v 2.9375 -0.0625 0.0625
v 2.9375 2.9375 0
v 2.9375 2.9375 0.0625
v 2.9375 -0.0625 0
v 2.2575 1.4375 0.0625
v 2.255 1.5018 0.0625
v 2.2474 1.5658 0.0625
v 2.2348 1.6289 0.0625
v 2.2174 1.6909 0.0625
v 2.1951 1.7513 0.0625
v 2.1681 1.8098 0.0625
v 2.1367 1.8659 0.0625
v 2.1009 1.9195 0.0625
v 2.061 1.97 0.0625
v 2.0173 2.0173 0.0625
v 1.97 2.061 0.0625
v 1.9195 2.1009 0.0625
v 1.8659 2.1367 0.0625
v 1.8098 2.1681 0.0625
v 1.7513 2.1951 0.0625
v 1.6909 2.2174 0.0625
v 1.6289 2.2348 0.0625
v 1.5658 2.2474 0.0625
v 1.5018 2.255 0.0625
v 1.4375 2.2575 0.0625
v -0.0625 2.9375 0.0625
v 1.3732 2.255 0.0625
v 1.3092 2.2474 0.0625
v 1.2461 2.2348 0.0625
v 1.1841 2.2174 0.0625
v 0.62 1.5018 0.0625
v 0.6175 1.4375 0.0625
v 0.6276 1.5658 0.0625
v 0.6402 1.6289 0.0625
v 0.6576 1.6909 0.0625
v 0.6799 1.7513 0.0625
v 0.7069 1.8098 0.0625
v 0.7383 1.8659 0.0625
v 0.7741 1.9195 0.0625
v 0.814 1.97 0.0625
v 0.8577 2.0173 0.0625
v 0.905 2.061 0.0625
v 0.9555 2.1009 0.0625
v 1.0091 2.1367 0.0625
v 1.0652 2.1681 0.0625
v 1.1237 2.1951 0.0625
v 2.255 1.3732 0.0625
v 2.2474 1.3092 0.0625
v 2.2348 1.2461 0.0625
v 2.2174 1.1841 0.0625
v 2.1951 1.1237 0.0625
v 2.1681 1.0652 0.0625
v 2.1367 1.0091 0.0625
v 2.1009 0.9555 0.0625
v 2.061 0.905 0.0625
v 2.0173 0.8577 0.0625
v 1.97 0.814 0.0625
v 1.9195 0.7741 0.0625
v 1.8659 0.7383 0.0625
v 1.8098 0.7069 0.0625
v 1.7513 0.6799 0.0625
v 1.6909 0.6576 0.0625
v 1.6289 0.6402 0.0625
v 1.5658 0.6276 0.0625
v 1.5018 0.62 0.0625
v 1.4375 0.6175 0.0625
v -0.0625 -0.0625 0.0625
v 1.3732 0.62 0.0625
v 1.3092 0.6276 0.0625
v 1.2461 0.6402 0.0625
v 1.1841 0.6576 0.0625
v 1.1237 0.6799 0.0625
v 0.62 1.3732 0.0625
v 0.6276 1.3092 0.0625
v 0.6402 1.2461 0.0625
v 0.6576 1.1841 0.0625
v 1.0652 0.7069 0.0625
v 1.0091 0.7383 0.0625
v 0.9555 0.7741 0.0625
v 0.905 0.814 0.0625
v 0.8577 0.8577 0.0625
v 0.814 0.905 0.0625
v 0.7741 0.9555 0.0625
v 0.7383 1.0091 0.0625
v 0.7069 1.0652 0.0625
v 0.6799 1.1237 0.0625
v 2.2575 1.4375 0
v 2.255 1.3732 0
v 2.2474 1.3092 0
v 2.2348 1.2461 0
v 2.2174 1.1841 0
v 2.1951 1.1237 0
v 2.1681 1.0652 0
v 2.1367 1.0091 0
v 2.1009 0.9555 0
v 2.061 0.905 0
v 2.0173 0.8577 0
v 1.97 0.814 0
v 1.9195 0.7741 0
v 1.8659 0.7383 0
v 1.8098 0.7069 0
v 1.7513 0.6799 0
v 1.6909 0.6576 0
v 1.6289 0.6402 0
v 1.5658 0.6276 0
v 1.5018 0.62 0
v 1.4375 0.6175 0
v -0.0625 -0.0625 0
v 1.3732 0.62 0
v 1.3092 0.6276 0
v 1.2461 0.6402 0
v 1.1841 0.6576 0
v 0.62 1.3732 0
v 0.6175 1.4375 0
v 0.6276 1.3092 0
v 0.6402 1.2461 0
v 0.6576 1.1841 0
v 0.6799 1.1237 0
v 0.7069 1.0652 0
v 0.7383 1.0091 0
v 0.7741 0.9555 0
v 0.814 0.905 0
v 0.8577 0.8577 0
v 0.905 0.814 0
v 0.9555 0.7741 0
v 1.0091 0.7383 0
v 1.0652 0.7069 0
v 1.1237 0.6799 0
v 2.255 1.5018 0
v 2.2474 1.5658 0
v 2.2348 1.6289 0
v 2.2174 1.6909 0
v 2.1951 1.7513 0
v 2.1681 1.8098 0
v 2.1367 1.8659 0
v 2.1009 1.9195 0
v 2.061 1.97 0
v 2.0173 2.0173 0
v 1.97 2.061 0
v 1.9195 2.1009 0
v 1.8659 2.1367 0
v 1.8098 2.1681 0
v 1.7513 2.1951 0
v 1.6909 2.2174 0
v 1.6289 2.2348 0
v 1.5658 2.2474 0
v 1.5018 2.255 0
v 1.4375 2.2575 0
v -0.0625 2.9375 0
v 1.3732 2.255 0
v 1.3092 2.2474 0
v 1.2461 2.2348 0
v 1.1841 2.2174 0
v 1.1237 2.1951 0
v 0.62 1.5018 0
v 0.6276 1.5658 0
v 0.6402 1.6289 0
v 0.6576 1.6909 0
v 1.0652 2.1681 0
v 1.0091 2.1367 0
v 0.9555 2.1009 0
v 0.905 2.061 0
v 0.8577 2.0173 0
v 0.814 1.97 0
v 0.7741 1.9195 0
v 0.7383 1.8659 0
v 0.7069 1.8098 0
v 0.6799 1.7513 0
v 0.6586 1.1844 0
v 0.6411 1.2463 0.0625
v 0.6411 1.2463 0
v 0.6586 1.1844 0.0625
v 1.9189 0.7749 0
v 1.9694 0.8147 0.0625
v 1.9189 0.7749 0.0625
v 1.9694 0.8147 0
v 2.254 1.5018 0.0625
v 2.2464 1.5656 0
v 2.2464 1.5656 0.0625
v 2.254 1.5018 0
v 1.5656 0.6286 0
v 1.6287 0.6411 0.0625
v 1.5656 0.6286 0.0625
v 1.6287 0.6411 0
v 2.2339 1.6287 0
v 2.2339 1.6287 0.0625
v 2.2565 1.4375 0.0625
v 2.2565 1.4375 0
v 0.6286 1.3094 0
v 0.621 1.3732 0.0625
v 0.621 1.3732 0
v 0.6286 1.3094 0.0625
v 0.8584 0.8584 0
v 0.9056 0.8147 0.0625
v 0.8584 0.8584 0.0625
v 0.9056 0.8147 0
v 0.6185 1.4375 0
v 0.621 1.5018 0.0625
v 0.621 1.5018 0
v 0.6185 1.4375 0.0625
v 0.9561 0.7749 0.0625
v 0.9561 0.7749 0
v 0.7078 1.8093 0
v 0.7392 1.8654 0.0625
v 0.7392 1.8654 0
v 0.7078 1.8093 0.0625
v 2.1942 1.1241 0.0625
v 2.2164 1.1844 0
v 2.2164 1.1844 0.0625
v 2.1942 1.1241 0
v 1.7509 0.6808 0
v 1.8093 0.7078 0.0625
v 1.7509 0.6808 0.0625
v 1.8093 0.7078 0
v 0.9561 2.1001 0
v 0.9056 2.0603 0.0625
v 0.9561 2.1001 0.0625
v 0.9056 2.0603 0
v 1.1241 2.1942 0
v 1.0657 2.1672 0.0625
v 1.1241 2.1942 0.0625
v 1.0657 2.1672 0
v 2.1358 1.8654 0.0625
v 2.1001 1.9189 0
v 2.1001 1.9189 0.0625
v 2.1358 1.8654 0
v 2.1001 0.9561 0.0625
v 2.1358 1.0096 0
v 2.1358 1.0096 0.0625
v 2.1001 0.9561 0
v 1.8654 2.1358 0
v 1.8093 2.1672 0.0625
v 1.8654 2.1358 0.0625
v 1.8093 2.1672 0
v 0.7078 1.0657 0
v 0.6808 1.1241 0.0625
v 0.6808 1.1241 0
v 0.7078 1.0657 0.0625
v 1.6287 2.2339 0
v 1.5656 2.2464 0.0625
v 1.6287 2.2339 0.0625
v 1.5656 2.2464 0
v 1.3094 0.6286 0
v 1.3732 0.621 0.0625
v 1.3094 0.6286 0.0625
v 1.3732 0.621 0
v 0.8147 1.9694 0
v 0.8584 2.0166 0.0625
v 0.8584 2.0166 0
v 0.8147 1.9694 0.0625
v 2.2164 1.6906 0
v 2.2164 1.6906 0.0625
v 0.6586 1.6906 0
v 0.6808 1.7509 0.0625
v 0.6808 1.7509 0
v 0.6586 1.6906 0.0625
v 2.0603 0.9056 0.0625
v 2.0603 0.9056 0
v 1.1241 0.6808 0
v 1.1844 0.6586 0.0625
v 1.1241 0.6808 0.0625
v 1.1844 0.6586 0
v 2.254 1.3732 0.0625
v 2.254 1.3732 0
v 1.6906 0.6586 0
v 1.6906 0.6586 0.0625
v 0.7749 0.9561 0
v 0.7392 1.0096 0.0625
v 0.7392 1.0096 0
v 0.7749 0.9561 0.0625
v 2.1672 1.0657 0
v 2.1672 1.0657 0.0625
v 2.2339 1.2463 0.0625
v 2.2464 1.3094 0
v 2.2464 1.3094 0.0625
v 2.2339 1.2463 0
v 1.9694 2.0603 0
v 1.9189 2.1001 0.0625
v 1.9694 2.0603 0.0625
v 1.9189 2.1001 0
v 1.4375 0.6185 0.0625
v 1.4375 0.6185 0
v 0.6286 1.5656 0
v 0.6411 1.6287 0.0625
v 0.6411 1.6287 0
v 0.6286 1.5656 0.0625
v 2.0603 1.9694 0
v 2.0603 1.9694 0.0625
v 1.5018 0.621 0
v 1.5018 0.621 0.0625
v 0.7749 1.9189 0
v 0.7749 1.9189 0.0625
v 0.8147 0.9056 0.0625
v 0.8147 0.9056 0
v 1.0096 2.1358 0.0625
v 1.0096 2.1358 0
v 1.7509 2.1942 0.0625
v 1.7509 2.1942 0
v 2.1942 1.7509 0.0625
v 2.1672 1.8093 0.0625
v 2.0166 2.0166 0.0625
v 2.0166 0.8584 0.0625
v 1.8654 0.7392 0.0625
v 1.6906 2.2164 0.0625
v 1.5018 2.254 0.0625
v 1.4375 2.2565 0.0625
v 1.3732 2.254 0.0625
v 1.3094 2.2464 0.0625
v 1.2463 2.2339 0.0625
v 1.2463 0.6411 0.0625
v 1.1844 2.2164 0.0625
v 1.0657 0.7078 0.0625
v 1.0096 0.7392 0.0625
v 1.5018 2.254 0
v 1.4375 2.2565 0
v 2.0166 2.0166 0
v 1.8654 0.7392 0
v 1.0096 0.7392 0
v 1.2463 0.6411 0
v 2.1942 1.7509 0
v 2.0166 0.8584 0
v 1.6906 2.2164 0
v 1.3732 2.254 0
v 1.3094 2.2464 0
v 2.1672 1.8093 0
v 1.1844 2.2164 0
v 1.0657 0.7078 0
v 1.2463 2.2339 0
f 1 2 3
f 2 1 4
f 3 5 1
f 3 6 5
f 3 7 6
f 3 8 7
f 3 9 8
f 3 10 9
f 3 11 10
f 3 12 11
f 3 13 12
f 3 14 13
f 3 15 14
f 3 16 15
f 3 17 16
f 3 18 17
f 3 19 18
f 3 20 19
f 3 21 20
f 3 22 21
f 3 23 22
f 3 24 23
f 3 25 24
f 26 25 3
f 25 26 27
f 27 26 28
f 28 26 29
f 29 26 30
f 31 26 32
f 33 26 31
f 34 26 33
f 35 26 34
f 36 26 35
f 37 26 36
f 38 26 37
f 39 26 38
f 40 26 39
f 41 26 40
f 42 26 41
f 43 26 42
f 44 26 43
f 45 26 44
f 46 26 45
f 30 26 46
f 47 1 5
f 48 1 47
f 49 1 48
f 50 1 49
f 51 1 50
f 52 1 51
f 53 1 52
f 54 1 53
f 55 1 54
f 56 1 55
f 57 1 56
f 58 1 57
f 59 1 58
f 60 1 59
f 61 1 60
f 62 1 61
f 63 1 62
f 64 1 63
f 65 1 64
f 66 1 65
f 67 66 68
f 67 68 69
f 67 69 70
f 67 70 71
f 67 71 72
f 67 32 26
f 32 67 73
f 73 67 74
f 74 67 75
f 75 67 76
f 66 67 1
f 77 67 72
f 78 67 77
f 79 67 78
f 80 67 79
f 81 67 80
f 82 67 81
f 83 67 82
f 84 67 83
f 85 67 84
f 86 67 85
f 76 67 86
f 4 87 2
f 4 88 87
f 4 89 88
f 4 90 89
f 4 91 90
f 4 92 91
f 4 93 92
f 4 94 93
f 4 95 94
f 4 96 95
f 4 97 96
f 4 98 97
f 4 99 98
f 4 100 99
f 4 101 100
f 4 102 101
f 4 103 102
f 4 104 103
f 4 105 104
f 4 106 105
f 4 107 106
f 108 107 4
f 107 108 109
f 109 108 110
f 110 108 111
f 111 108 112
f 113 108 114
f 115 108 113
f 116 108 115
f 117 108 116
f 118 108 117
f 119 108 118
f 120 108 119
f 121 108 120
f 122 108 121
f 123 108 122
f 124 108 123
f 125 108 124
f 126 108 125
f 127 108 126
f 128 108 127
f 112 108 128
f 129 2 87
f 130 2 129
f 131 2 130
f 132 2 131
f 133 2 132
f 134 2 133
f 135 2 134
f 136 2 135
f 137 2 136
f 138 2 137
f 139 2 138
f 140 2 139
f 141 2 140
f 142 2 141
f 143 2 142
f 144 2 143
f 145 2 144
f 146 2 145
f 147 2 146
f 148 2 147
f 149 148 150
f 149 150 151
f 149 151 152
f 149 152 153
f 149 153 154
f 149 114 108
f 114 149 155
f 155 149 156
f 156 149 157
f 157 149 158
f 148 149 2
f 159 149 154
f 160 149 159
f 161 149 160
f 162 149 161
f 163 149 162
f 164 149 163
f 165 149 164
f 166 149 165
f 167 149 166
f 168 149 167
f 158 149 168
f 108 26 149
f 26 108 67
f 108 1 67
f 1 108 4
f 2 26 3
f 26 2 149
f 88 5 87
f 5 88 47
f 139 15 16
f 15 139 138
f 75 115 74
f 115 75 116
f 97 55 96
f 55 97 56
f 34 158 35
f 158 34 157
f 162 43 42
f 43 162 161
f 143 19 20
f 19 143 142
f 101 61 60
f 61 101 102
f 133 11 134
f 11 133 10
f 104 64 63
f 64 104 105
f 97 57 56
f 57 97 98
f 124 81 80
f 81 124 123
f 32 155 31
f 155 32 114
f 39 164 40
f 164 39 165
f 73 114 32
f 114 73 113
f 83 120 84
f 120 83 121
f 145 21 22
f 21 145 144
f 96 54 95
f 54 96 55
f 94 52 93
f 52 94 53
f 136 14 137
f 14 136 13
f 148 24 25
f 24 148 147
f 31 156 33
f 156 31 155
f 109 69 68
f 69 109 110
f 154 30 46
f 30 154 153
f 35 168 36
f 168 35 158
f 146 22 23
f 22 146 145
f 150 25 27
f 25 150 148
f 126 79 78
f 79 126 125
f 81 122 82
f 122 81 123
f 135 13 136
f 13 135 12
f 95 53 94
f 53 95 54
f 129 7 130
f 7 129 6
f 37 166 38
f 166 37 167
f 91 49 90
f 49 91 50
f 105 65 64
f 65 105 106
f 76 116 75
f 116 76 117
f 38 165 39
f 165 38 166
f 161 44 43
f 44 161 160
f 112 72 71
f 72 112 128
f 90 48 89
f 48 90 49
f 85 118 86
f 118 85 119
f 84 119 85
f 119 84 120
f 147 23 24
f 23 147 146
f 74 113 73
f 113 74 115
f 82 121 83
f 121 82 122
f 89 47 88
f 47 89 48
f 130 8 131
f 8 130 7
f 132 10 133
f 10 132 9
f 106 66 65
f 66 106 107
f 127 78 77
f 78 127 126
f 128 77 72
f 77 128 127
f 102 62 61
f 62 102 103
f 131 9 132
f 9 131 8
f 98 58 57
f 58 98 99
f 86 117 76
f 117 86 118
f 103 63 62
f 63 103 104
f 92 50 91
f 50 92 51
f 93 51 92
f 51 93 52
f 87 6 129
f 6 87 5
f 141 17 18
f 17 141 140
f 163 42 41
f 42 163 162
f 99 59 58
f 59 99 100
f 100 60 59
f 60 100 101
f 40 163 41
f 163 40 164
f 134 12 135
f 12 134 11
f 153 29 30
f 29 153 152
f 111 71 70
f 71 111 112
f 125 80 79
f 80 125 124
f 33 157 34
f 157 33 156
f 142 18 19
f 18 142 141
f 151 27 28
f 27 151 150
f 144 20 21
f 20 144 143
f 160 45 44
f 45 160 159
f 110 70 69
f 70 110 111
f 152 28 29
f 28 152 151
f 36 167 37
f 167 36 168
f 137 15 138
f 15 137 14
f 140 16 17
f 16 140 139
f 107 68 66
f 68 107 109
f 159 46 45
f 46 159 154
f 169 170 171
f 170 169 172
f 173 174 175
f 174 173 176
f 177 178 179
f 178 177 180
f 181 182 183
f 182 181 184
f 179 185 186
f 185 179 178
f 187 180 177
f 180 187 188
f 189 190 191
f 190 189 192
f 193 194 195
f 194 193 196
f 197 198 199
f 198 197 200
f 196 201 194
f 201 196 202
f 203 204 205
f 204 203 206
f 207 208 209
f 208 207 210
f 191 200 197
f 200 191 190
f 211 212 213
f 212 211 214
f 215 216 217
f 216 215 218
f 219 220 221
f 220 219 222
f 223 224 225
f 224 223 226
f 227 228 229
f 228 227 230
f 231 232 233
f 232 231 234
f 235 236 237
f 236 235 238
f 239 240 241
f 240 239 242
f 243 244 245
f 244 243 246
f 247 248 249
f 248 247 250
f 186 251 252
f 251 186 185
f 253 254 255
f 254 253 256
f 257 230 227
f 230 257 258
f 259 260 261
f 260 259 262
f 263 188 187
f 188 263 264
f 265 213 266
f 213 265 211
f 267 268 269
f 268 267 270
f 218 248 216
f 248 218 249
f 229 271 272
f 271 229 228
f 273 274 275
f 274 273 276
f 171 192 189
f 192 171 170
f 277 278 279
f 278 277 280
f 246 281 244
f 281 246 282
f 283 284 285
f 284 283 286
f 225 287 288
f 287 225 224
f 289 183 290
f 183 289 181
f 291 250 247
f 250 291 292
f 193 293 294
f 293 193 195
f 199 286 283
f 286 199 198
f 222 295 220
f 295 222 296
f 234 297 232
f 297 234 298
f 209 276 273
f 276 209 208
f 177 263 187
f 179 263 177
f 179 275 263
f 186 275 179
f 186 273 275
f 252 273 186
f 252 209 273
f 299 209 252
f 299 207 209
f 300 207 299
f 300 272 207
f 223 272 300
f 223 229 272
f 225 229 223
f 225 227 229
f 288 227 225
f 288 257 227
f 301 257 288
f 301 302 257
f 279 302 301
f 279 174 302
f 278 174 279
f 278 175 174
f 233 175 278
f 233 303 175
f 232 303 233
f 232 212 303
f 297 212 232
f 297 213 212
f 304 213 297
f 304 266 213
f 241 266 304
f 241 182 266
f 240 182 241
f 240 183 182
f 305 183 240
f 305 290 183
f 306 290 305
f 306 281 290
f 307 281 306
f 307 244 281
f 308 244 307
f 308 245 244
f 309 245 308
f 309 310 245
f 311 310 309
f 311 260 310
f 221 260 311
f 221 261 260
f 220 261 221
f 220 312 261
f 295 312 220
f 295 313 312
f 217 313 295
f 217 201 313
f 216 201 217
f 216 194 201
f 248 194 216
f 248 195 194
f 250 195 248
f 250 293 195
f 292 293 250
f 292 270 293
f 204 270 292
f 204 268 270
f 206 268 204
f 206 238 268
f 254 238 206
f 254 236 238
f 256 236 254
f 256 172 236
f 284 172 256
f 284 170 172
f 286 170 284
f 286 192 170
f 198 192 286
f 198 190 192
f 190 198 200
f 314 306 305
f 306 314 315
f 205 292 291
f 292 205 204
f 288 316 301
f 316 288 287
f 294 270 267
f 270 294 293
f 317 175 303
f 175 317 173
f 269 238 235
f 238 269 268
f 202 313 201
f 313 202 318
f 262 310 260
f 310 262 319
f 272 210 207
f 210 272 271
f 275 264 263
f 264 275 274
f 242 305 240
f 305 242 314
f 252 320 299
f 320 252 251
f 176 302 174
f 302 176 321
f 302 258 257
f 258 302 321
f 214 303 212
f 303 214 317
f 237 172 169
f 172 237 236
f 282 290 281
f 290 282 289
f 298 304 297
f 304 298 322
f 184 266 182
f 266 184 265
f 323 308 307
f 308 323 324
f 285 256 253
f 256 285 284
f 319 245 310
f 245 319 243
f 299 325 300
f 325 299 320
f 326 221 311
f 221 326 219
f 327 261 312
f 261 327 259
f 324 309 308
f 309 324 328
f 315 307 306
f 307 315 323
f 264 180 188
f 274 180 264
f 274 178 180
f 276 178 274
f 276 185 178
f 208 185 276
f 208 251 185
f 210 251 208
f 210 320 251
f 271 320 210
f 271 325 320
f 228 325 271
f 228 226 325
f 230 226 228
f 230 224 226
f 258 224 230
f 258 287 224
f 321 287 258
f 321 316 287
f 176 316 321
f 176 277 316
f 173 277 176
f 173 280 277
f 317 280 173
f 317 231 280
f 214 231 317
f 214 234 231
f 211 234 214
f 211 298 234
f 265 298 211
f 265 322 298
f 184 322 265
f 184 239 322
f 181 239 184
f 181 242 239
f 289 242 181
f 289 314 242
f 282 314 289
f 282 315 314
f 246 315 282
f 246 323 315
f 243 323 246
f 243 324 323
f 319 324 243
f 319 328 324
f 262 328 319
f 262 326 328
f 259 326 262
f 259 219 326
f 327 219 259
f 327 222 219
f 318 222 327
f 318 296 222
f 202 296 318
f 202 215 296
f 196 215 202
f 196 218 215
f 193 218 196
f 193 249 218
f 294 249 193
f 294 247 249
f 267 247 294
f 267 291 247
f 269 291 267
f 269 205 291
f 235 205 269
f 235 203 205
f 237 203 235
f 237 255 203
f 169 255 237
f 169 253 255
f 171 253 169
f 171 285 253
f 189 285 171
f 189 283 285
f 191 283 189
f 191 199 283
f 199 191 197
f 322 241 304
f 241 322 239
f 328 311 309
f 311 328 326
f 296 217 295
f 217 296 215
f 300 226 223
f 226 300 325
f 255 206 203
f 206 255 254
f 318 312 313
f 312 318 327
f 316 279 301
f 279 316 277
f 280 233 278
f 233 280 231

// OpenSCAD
// element110-7.scad
// Gear tile variant — number "7" in the bore.
// Units: inches

plate_w = 2 + 7/8;
plate_d = 2 + 7/8;
plate_h = 1/16;
frame_w = 1/16;

hole_d = 3/32;
hole_r = hole_d / 2;

// Gear geometry — centered on tile
gear_n      = 20;
gear_r_tip  = 1.18;
gear_r_root = 1.00;
gear_r_bore = 0.82;
tooth_hw    = 4.5;
tooth_tip_f = 0.80;

// ── Standard modules ─────────────────────────────────────────────────────────

module rivet_holes() {
    spacing_x = plate_w / 10;
    spacing_y = plate_d / 10;
    inset_x   = spacing_x / 2;
    inset_y   = spacing_y / 2;
    for (i = [0:9]) translate([inset_x + i * spacing_x, inset_y,           -1]) cylinder(h = plate_h + 2, r = hole_r, $fn = 20);
    for (i = [0:9]) translate([inset_x + i * spacing_x, plate_d - inset_y, -0.001]) cylinder(h = plate_h + 0.002, r = hole_r, $fn = 20);
    for (i = [0:9]) translate([inset_x,           inset_y + i * spacing_y, -0.001]) cylinder(h = plate_h + 0.002, r = hole_r, $fn = 20);
    for (i = [0:9]) translate([plate_w - inset_x, inset_y + i * spacing_y, -0.001]) cylinder(h = plate_h + 0.002, r = hole_r, $fn = 20);
}

module frame_with_id(colors = []) {
    id_cover = plate_h / 8;
    region_w = (plate_w + 2 * frame_w) / 6;
    mark_h   = plate_h - id_cover;

    color("black")
    difference() {
        translate([-frame_w, -frame_w, 0])
            cube([plate_w + 2 * frame_w, plate_d + 2 * frame_w, plate_h]);
        translate([0, 0, -0.001])
            cube([plate_w, plate_d, plate_h + 0.002]);
        translate([-frame_w, plate_d, -0.001])
            cube([plate_w + 2 * frame_w, frame_w + 0.002, plate_h + 0.002]);
    }

    for (i = [0:5]) {
        c = (colors[i] != undef) ? colors[i] : "black";
        color(c)
        translate([-frame_w + i * region_w, plate_d, 0])
            cube([region_w, frame_w, mark_h]);
        color("black")
        translate([-frame_w + i * region_w, plate_d, mark_h])
            cube([region_w, frame_w, id_cover]);
    }
}

module plate() {
    color("darkgray")
    cube([plate_w, plate_d, plate_h]);
}

rivet_h = plate_h;
module rivets() {
    spacing_x = plate_w / 10;
    spacing_y = plate_d / 10;
    inset_x   = spacing_x / 2;
    inset_y   = spacing_y / 2;
    color("lightgray") {
        for (i = [0:9]) translate([inset_x + i * spacing_x, inset_y,           0]) cylinder(h = rivet_h, r = hole_r, $fn = 20);
        for (i = [0:9]) translate([inset_x + i * spacing_x, plate_d - inset_y, 0]) cylinder(h = rivet_h, r = hole_r, $fn = 20);
        for (i = [0:9]) translate([inset_x,           inset_y + i * spacing_y, 0]) cylinder(h = rivet_h, r = hole_r, $fn = 20);
        for (i = [0:9]) translate([plate_w - inset_x, inset_y + i * spacing_y, 0]) cylinder(h = rivet_h, r = hole_r, $fn = 20);
    }
}

// ── Gear 2D helpers ───────────────────────────────────────────────────────────

module gear_tooth_2d() {
    polygon([
        [gear_r_root * cos(-tooth_hw),               gear_r_root * sin(-tooth_hw)],
        [gear_r_tip  * cos(-tooth_hw * tooth_tip_f),  gear_r_tip  * sin(-tooth_hw * tooth_tip_f)],
        [gear_r_tip  * cos( tooth_hw * tooth_tip_f),  gear_r_tip  * sin( tooth_hw * tooth_tip_f)],
        [gear_r_root * cos( tooth_hw),               gear_r_root * sin( tooth_hw)],
    ]);
}

module gear_2d() {
    pitch = 360 / gear_n;
    union() {
        circle(r = gear_r_root, $fn = gear_n * 8);
        for (i = [0:gear_n - 1]) rotate([0, 0, i * pitch]) gear_tooth_2d();
    }
}

// ── Gear holes & gear ────────────────────────────────────────────────────────

module gear_holes() {
    translate([plate_w / 2, plate_d / 2, -0.001])
    linear_extrude(plate_h + 0.002)
    difference() {
        gear_2d();
        circle(r = gear_r_bore, $fn = 80);
    }
}

module gear() {
    color("black")
    translate([plate_w / 2, plate_d / 2, 0])
    linear_extrude(plate_h)
    difference() { gear_2d(); circle(r = gear_r_bore, $fn = 80); }
}

// ── Gear bore hole & gear bore ────────────────────────────────────────────────

module gear_bore_holes() {
    translate([plate_w / 2, plate_d / 2, -0.001])
    linear_extrude(plate_h + 0.002)
    circle(r = gear_r_bore, $fn = 80);
}

module gear_bore() {
    color([0.80, 0.80, 0.80])
    translate([plate_w / 2, plate_d / 2, 0])
    linear_extrude(plate_h)
    circle(r = gear_r_bore - 0.001, $fn = 80);
}

// ── Label hole → label ────────────────────────────────────────────────────────

module label_holes() {
    translate([plate_w / 2, plate_d / 2, -0.001])
    linear_extrude(plate_h + 0.002)
    text("7", size = 1.1, halign = "center", valign = "center",
         font = "Liberation Sans:style=Bold");
}

module label() {
    color("green")
    translate([plate_w / 2, plate_d / 2, 0])
    linear_extrude(plate_h)
    text("7", size = 1.1, halign = "center", valign = "center",
         font = "Liberation Sans:style=Bold");
}

// ── Assembly ──────────────────────────────────────────────────────────────────
// Each level: difference() cuts the holes INTO the running assembly,
//             union() then adds the feature that fills those holes.
// Innermost = first step; outermost = last step.

frame_with_id([undef, "green", "green", "green", "green", undef]);

union() {                                           // step 5: add label
    difference() {
        union() {                                   // step 4: add gear bore
            difference() {
                union() {                           // step 3: add gear
                    difference() {
                        union() {                   // step 2: add rivets
                            difference() {
                                plate();            // step 1: plate
                                rivet_holes();
                            }
                            rivets();
                        }
                        gear_holes();
                    }
                    gear();
                }
                gear_bore_holes();
            }
            gear_bore();
        }
        label_holes();
    }
    label();
}
